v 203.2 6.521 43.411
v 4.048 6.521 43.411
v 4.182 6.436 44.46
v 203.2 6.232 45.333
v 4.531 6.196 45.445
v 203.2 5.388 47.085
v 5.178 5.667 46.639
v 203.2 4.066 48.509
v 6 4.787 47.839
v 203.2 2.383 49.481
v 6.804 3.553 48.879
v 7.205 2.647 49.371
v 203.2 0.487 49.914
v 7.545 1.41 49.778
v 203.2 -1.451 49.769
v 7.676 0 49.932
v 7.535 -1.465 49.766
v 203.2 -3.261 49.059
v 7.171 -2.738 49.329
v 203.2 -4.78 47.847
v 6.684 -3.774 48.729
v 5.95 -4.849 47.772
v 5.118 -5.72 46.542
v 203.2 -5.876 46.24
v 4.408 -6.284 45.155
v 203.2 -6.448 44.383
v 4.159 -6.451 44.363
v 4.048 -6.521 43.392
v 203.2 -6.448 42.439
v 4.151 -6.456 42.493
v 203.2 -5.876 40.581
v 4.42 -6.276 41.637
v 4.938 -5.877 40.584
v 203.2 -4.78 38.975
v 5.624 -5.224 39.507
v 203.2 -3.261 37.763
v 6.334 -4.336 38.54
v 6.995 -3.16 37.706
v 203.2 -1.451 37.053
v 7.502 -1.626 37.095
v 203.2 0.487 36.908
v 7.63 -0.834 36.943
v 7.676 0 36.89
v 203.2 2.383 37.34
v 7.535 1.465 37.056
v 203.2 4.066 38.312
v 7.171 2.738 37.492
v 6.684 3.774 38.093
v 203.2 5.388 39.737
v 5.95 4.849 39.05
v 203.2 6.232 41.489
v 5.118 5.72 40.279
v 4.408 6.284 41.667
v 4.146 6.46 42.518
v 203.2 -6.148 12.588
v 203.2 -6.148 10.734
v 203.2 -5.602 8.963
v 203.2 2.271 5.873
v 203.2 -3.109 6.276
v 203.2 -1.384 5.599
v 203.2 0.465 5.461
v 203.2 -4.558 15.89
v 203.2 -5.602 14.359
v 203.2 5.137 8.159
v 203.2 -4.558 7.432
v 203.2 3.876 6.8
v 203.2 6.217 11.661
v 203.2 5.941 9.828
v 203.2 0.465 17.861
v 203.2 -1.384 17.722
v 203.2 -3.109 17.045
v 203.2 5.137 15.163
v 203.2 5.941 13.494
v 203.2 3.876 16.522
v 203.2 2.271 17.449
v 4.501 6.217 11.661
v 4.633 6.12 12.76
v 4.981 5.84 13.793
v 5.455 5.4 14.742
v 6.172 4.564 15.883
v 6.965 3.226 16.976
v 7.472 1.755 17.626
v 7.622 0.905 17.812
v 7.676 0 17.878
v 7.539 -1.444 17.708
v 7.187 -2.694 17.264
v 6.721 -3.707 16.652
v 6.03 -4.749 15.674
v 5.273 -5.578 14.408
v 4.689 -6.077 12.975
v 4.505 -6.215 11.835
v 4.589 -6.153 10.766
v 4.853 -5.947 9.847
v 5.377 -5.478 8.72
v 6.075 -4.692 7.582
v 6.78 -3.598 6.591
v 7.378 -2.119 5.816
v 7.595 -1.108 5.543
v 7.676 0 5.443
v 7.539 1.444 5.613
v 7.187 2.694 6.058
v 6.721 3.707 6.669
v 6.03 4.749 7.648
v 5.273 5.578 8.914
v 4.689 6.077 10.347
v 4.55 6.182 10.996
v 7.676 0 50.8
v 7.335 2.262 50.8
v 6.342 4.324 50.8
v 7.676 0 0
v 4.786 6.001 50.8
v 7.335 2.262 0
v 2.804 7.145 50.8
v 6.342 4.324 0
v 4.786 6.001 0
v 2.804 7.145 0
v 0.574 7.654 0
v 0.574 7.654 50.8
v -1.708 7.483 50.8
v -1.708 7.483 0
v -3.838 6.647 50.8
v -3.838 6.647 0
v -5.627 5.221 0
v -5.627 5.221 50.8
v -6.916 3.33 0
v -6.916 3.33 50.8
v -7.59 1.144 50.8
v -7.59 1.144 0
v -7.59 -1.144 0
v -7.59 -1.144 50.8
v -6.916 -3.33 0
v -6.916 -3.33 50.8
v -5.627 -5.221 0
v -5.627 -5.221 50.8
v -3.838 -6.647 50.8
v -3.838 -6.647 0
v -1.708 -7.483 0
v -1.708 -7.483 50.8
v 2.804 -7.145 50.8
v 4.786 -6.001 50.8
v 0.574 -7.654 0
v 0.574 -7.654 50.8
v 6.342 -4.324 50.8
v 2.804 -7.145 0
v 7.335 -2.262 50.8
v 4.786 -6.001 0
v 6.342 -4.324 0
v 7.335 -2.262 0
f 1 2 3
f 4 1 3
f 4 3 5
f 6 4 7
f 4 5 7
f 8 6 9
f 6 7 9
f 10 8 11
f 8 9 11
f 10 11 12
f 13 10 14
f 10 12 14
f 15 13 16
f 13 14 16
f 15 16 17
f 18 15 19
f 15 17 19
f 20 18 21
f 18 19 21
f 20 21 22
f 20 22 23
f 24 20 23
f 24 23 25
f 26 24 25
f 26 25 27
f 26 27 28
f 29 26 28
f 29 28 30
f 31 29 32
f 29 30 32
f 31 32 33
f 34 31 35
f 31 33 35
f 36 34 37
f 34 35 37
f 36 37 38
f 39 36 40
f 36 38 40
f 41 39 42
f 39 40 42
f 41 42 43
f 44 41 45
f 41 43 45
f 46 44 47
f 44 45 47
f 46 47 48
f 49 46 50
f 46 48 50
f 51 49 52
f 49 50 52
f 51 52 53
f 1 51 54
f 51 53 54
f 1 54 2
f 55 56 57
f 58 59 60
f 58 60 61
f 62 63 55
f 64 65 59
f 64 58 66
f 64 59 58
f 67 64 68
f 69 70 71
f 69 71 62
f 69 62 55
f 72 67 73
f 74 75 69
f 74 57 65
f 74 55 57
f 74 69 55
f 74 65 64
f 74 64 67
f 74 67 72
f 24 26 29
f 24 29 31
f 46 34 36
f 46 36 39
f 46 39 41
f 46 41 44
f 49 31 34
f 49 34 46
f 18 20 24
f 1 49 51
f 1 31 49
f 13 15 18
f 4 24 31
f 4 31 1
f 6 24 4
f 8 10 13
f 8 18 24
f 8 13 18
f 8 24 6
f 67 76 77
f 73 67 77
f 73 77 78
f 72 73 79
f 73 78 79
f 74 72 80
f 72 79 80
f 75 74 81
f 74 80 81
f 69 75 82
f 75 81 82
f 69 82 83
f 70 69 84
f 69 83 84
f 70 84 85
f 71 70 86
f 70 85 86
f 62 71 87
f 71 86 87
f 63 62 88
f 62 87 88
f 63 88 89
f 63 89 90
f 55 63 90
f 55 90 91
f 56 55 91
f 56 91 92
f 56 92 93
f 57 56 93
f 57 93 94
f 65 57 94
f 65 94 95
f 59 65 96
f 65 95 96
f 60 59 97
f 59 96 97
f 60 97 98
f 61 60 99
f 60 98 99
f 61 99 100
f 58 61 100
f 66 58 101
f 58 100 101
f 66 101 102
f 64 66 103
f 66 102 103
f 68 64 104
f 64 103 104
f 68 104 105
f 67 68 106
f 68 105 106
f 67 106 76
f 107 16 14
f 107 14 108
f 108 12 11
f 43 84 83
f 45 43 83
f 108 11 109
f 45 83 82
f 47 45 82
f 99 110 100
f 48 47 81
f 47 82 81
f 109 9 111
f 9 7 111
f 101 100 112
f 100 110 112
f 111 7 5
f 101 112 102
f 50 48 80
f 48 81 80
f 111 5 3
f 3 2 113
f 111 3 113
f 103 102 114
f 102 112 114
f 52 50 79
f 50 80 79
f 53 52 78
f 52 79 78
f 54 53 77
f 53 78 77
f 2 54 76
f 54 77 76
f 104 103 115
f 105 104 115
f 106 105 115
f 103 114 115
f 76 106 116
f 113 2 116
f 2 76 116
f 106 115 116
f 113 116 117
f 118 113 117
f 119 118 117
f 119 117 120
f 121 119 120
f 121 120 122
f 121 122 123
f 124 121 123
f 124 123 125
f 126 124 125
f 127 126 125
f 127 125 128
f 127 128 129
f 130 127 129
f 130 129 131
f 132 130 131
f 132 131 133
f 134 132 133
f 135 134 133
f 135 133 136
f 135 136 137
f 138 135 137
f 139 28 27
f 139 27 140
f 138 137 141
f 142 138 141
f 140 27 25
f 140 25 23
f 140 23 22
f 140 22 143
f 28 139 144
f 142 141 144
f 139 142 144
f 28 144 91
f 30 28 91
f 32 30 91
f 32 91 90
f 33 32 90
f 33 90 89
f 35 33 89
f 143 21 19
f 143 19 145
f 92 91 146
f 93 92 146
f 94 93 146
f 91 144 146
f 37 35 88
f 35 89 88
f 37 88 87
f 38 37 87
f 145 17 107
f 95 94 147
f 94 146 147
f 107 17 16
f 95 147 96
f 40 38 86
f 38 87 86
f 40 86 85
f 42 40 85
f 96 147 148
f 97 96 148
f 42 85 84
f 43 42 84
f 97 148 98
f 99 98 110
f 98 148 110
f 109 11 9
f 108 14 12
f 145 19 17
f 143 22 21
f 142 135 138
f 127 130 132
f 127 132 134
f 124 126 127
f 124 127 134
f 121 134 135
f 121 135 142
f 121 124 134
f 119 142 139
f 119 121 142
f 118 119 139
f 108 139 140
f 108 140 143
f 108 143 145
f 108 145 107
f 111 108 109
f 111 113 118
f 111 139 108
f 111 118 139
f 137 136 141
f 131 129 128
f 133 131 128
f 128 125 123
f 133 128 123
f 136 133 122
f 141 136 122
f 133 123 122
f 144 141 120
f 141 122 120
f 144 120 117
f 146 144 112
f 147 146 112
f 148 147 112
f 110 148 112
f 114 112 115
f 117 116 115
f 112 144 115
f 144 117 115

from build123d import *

# Parameters (mm, degrees)
F0_R     = 7.675775
F1_DEPTH = 50.8
F2_R     = 6.521337
F3_DEPTH = 203.2
F4_R     = 6.217419
F5_DEPTH = 203.2


with BuildPart() as f1:
    # F0 (on Top) → F1 (new body)
    with BuildSketch(Plane.XY):
        Circle(F0_R)
    extrude(amount=F1_DEPTH)

    # F2 (on Right) → F3 (join)
    with BuildSketch(Plane.YZ):
        with Locations((0, 43.410912)):
            Circle(F2_R)
    extrude(amount=F3_DEPTH)

    # F4 (on Right) → F5 (join)
    with BuildSketch(Plane.YZ):
        with Locations((0, 11.660909)):
            Circle(F4_R)
    extrude(amount=F5_DEPTH)


solid = f1.part
